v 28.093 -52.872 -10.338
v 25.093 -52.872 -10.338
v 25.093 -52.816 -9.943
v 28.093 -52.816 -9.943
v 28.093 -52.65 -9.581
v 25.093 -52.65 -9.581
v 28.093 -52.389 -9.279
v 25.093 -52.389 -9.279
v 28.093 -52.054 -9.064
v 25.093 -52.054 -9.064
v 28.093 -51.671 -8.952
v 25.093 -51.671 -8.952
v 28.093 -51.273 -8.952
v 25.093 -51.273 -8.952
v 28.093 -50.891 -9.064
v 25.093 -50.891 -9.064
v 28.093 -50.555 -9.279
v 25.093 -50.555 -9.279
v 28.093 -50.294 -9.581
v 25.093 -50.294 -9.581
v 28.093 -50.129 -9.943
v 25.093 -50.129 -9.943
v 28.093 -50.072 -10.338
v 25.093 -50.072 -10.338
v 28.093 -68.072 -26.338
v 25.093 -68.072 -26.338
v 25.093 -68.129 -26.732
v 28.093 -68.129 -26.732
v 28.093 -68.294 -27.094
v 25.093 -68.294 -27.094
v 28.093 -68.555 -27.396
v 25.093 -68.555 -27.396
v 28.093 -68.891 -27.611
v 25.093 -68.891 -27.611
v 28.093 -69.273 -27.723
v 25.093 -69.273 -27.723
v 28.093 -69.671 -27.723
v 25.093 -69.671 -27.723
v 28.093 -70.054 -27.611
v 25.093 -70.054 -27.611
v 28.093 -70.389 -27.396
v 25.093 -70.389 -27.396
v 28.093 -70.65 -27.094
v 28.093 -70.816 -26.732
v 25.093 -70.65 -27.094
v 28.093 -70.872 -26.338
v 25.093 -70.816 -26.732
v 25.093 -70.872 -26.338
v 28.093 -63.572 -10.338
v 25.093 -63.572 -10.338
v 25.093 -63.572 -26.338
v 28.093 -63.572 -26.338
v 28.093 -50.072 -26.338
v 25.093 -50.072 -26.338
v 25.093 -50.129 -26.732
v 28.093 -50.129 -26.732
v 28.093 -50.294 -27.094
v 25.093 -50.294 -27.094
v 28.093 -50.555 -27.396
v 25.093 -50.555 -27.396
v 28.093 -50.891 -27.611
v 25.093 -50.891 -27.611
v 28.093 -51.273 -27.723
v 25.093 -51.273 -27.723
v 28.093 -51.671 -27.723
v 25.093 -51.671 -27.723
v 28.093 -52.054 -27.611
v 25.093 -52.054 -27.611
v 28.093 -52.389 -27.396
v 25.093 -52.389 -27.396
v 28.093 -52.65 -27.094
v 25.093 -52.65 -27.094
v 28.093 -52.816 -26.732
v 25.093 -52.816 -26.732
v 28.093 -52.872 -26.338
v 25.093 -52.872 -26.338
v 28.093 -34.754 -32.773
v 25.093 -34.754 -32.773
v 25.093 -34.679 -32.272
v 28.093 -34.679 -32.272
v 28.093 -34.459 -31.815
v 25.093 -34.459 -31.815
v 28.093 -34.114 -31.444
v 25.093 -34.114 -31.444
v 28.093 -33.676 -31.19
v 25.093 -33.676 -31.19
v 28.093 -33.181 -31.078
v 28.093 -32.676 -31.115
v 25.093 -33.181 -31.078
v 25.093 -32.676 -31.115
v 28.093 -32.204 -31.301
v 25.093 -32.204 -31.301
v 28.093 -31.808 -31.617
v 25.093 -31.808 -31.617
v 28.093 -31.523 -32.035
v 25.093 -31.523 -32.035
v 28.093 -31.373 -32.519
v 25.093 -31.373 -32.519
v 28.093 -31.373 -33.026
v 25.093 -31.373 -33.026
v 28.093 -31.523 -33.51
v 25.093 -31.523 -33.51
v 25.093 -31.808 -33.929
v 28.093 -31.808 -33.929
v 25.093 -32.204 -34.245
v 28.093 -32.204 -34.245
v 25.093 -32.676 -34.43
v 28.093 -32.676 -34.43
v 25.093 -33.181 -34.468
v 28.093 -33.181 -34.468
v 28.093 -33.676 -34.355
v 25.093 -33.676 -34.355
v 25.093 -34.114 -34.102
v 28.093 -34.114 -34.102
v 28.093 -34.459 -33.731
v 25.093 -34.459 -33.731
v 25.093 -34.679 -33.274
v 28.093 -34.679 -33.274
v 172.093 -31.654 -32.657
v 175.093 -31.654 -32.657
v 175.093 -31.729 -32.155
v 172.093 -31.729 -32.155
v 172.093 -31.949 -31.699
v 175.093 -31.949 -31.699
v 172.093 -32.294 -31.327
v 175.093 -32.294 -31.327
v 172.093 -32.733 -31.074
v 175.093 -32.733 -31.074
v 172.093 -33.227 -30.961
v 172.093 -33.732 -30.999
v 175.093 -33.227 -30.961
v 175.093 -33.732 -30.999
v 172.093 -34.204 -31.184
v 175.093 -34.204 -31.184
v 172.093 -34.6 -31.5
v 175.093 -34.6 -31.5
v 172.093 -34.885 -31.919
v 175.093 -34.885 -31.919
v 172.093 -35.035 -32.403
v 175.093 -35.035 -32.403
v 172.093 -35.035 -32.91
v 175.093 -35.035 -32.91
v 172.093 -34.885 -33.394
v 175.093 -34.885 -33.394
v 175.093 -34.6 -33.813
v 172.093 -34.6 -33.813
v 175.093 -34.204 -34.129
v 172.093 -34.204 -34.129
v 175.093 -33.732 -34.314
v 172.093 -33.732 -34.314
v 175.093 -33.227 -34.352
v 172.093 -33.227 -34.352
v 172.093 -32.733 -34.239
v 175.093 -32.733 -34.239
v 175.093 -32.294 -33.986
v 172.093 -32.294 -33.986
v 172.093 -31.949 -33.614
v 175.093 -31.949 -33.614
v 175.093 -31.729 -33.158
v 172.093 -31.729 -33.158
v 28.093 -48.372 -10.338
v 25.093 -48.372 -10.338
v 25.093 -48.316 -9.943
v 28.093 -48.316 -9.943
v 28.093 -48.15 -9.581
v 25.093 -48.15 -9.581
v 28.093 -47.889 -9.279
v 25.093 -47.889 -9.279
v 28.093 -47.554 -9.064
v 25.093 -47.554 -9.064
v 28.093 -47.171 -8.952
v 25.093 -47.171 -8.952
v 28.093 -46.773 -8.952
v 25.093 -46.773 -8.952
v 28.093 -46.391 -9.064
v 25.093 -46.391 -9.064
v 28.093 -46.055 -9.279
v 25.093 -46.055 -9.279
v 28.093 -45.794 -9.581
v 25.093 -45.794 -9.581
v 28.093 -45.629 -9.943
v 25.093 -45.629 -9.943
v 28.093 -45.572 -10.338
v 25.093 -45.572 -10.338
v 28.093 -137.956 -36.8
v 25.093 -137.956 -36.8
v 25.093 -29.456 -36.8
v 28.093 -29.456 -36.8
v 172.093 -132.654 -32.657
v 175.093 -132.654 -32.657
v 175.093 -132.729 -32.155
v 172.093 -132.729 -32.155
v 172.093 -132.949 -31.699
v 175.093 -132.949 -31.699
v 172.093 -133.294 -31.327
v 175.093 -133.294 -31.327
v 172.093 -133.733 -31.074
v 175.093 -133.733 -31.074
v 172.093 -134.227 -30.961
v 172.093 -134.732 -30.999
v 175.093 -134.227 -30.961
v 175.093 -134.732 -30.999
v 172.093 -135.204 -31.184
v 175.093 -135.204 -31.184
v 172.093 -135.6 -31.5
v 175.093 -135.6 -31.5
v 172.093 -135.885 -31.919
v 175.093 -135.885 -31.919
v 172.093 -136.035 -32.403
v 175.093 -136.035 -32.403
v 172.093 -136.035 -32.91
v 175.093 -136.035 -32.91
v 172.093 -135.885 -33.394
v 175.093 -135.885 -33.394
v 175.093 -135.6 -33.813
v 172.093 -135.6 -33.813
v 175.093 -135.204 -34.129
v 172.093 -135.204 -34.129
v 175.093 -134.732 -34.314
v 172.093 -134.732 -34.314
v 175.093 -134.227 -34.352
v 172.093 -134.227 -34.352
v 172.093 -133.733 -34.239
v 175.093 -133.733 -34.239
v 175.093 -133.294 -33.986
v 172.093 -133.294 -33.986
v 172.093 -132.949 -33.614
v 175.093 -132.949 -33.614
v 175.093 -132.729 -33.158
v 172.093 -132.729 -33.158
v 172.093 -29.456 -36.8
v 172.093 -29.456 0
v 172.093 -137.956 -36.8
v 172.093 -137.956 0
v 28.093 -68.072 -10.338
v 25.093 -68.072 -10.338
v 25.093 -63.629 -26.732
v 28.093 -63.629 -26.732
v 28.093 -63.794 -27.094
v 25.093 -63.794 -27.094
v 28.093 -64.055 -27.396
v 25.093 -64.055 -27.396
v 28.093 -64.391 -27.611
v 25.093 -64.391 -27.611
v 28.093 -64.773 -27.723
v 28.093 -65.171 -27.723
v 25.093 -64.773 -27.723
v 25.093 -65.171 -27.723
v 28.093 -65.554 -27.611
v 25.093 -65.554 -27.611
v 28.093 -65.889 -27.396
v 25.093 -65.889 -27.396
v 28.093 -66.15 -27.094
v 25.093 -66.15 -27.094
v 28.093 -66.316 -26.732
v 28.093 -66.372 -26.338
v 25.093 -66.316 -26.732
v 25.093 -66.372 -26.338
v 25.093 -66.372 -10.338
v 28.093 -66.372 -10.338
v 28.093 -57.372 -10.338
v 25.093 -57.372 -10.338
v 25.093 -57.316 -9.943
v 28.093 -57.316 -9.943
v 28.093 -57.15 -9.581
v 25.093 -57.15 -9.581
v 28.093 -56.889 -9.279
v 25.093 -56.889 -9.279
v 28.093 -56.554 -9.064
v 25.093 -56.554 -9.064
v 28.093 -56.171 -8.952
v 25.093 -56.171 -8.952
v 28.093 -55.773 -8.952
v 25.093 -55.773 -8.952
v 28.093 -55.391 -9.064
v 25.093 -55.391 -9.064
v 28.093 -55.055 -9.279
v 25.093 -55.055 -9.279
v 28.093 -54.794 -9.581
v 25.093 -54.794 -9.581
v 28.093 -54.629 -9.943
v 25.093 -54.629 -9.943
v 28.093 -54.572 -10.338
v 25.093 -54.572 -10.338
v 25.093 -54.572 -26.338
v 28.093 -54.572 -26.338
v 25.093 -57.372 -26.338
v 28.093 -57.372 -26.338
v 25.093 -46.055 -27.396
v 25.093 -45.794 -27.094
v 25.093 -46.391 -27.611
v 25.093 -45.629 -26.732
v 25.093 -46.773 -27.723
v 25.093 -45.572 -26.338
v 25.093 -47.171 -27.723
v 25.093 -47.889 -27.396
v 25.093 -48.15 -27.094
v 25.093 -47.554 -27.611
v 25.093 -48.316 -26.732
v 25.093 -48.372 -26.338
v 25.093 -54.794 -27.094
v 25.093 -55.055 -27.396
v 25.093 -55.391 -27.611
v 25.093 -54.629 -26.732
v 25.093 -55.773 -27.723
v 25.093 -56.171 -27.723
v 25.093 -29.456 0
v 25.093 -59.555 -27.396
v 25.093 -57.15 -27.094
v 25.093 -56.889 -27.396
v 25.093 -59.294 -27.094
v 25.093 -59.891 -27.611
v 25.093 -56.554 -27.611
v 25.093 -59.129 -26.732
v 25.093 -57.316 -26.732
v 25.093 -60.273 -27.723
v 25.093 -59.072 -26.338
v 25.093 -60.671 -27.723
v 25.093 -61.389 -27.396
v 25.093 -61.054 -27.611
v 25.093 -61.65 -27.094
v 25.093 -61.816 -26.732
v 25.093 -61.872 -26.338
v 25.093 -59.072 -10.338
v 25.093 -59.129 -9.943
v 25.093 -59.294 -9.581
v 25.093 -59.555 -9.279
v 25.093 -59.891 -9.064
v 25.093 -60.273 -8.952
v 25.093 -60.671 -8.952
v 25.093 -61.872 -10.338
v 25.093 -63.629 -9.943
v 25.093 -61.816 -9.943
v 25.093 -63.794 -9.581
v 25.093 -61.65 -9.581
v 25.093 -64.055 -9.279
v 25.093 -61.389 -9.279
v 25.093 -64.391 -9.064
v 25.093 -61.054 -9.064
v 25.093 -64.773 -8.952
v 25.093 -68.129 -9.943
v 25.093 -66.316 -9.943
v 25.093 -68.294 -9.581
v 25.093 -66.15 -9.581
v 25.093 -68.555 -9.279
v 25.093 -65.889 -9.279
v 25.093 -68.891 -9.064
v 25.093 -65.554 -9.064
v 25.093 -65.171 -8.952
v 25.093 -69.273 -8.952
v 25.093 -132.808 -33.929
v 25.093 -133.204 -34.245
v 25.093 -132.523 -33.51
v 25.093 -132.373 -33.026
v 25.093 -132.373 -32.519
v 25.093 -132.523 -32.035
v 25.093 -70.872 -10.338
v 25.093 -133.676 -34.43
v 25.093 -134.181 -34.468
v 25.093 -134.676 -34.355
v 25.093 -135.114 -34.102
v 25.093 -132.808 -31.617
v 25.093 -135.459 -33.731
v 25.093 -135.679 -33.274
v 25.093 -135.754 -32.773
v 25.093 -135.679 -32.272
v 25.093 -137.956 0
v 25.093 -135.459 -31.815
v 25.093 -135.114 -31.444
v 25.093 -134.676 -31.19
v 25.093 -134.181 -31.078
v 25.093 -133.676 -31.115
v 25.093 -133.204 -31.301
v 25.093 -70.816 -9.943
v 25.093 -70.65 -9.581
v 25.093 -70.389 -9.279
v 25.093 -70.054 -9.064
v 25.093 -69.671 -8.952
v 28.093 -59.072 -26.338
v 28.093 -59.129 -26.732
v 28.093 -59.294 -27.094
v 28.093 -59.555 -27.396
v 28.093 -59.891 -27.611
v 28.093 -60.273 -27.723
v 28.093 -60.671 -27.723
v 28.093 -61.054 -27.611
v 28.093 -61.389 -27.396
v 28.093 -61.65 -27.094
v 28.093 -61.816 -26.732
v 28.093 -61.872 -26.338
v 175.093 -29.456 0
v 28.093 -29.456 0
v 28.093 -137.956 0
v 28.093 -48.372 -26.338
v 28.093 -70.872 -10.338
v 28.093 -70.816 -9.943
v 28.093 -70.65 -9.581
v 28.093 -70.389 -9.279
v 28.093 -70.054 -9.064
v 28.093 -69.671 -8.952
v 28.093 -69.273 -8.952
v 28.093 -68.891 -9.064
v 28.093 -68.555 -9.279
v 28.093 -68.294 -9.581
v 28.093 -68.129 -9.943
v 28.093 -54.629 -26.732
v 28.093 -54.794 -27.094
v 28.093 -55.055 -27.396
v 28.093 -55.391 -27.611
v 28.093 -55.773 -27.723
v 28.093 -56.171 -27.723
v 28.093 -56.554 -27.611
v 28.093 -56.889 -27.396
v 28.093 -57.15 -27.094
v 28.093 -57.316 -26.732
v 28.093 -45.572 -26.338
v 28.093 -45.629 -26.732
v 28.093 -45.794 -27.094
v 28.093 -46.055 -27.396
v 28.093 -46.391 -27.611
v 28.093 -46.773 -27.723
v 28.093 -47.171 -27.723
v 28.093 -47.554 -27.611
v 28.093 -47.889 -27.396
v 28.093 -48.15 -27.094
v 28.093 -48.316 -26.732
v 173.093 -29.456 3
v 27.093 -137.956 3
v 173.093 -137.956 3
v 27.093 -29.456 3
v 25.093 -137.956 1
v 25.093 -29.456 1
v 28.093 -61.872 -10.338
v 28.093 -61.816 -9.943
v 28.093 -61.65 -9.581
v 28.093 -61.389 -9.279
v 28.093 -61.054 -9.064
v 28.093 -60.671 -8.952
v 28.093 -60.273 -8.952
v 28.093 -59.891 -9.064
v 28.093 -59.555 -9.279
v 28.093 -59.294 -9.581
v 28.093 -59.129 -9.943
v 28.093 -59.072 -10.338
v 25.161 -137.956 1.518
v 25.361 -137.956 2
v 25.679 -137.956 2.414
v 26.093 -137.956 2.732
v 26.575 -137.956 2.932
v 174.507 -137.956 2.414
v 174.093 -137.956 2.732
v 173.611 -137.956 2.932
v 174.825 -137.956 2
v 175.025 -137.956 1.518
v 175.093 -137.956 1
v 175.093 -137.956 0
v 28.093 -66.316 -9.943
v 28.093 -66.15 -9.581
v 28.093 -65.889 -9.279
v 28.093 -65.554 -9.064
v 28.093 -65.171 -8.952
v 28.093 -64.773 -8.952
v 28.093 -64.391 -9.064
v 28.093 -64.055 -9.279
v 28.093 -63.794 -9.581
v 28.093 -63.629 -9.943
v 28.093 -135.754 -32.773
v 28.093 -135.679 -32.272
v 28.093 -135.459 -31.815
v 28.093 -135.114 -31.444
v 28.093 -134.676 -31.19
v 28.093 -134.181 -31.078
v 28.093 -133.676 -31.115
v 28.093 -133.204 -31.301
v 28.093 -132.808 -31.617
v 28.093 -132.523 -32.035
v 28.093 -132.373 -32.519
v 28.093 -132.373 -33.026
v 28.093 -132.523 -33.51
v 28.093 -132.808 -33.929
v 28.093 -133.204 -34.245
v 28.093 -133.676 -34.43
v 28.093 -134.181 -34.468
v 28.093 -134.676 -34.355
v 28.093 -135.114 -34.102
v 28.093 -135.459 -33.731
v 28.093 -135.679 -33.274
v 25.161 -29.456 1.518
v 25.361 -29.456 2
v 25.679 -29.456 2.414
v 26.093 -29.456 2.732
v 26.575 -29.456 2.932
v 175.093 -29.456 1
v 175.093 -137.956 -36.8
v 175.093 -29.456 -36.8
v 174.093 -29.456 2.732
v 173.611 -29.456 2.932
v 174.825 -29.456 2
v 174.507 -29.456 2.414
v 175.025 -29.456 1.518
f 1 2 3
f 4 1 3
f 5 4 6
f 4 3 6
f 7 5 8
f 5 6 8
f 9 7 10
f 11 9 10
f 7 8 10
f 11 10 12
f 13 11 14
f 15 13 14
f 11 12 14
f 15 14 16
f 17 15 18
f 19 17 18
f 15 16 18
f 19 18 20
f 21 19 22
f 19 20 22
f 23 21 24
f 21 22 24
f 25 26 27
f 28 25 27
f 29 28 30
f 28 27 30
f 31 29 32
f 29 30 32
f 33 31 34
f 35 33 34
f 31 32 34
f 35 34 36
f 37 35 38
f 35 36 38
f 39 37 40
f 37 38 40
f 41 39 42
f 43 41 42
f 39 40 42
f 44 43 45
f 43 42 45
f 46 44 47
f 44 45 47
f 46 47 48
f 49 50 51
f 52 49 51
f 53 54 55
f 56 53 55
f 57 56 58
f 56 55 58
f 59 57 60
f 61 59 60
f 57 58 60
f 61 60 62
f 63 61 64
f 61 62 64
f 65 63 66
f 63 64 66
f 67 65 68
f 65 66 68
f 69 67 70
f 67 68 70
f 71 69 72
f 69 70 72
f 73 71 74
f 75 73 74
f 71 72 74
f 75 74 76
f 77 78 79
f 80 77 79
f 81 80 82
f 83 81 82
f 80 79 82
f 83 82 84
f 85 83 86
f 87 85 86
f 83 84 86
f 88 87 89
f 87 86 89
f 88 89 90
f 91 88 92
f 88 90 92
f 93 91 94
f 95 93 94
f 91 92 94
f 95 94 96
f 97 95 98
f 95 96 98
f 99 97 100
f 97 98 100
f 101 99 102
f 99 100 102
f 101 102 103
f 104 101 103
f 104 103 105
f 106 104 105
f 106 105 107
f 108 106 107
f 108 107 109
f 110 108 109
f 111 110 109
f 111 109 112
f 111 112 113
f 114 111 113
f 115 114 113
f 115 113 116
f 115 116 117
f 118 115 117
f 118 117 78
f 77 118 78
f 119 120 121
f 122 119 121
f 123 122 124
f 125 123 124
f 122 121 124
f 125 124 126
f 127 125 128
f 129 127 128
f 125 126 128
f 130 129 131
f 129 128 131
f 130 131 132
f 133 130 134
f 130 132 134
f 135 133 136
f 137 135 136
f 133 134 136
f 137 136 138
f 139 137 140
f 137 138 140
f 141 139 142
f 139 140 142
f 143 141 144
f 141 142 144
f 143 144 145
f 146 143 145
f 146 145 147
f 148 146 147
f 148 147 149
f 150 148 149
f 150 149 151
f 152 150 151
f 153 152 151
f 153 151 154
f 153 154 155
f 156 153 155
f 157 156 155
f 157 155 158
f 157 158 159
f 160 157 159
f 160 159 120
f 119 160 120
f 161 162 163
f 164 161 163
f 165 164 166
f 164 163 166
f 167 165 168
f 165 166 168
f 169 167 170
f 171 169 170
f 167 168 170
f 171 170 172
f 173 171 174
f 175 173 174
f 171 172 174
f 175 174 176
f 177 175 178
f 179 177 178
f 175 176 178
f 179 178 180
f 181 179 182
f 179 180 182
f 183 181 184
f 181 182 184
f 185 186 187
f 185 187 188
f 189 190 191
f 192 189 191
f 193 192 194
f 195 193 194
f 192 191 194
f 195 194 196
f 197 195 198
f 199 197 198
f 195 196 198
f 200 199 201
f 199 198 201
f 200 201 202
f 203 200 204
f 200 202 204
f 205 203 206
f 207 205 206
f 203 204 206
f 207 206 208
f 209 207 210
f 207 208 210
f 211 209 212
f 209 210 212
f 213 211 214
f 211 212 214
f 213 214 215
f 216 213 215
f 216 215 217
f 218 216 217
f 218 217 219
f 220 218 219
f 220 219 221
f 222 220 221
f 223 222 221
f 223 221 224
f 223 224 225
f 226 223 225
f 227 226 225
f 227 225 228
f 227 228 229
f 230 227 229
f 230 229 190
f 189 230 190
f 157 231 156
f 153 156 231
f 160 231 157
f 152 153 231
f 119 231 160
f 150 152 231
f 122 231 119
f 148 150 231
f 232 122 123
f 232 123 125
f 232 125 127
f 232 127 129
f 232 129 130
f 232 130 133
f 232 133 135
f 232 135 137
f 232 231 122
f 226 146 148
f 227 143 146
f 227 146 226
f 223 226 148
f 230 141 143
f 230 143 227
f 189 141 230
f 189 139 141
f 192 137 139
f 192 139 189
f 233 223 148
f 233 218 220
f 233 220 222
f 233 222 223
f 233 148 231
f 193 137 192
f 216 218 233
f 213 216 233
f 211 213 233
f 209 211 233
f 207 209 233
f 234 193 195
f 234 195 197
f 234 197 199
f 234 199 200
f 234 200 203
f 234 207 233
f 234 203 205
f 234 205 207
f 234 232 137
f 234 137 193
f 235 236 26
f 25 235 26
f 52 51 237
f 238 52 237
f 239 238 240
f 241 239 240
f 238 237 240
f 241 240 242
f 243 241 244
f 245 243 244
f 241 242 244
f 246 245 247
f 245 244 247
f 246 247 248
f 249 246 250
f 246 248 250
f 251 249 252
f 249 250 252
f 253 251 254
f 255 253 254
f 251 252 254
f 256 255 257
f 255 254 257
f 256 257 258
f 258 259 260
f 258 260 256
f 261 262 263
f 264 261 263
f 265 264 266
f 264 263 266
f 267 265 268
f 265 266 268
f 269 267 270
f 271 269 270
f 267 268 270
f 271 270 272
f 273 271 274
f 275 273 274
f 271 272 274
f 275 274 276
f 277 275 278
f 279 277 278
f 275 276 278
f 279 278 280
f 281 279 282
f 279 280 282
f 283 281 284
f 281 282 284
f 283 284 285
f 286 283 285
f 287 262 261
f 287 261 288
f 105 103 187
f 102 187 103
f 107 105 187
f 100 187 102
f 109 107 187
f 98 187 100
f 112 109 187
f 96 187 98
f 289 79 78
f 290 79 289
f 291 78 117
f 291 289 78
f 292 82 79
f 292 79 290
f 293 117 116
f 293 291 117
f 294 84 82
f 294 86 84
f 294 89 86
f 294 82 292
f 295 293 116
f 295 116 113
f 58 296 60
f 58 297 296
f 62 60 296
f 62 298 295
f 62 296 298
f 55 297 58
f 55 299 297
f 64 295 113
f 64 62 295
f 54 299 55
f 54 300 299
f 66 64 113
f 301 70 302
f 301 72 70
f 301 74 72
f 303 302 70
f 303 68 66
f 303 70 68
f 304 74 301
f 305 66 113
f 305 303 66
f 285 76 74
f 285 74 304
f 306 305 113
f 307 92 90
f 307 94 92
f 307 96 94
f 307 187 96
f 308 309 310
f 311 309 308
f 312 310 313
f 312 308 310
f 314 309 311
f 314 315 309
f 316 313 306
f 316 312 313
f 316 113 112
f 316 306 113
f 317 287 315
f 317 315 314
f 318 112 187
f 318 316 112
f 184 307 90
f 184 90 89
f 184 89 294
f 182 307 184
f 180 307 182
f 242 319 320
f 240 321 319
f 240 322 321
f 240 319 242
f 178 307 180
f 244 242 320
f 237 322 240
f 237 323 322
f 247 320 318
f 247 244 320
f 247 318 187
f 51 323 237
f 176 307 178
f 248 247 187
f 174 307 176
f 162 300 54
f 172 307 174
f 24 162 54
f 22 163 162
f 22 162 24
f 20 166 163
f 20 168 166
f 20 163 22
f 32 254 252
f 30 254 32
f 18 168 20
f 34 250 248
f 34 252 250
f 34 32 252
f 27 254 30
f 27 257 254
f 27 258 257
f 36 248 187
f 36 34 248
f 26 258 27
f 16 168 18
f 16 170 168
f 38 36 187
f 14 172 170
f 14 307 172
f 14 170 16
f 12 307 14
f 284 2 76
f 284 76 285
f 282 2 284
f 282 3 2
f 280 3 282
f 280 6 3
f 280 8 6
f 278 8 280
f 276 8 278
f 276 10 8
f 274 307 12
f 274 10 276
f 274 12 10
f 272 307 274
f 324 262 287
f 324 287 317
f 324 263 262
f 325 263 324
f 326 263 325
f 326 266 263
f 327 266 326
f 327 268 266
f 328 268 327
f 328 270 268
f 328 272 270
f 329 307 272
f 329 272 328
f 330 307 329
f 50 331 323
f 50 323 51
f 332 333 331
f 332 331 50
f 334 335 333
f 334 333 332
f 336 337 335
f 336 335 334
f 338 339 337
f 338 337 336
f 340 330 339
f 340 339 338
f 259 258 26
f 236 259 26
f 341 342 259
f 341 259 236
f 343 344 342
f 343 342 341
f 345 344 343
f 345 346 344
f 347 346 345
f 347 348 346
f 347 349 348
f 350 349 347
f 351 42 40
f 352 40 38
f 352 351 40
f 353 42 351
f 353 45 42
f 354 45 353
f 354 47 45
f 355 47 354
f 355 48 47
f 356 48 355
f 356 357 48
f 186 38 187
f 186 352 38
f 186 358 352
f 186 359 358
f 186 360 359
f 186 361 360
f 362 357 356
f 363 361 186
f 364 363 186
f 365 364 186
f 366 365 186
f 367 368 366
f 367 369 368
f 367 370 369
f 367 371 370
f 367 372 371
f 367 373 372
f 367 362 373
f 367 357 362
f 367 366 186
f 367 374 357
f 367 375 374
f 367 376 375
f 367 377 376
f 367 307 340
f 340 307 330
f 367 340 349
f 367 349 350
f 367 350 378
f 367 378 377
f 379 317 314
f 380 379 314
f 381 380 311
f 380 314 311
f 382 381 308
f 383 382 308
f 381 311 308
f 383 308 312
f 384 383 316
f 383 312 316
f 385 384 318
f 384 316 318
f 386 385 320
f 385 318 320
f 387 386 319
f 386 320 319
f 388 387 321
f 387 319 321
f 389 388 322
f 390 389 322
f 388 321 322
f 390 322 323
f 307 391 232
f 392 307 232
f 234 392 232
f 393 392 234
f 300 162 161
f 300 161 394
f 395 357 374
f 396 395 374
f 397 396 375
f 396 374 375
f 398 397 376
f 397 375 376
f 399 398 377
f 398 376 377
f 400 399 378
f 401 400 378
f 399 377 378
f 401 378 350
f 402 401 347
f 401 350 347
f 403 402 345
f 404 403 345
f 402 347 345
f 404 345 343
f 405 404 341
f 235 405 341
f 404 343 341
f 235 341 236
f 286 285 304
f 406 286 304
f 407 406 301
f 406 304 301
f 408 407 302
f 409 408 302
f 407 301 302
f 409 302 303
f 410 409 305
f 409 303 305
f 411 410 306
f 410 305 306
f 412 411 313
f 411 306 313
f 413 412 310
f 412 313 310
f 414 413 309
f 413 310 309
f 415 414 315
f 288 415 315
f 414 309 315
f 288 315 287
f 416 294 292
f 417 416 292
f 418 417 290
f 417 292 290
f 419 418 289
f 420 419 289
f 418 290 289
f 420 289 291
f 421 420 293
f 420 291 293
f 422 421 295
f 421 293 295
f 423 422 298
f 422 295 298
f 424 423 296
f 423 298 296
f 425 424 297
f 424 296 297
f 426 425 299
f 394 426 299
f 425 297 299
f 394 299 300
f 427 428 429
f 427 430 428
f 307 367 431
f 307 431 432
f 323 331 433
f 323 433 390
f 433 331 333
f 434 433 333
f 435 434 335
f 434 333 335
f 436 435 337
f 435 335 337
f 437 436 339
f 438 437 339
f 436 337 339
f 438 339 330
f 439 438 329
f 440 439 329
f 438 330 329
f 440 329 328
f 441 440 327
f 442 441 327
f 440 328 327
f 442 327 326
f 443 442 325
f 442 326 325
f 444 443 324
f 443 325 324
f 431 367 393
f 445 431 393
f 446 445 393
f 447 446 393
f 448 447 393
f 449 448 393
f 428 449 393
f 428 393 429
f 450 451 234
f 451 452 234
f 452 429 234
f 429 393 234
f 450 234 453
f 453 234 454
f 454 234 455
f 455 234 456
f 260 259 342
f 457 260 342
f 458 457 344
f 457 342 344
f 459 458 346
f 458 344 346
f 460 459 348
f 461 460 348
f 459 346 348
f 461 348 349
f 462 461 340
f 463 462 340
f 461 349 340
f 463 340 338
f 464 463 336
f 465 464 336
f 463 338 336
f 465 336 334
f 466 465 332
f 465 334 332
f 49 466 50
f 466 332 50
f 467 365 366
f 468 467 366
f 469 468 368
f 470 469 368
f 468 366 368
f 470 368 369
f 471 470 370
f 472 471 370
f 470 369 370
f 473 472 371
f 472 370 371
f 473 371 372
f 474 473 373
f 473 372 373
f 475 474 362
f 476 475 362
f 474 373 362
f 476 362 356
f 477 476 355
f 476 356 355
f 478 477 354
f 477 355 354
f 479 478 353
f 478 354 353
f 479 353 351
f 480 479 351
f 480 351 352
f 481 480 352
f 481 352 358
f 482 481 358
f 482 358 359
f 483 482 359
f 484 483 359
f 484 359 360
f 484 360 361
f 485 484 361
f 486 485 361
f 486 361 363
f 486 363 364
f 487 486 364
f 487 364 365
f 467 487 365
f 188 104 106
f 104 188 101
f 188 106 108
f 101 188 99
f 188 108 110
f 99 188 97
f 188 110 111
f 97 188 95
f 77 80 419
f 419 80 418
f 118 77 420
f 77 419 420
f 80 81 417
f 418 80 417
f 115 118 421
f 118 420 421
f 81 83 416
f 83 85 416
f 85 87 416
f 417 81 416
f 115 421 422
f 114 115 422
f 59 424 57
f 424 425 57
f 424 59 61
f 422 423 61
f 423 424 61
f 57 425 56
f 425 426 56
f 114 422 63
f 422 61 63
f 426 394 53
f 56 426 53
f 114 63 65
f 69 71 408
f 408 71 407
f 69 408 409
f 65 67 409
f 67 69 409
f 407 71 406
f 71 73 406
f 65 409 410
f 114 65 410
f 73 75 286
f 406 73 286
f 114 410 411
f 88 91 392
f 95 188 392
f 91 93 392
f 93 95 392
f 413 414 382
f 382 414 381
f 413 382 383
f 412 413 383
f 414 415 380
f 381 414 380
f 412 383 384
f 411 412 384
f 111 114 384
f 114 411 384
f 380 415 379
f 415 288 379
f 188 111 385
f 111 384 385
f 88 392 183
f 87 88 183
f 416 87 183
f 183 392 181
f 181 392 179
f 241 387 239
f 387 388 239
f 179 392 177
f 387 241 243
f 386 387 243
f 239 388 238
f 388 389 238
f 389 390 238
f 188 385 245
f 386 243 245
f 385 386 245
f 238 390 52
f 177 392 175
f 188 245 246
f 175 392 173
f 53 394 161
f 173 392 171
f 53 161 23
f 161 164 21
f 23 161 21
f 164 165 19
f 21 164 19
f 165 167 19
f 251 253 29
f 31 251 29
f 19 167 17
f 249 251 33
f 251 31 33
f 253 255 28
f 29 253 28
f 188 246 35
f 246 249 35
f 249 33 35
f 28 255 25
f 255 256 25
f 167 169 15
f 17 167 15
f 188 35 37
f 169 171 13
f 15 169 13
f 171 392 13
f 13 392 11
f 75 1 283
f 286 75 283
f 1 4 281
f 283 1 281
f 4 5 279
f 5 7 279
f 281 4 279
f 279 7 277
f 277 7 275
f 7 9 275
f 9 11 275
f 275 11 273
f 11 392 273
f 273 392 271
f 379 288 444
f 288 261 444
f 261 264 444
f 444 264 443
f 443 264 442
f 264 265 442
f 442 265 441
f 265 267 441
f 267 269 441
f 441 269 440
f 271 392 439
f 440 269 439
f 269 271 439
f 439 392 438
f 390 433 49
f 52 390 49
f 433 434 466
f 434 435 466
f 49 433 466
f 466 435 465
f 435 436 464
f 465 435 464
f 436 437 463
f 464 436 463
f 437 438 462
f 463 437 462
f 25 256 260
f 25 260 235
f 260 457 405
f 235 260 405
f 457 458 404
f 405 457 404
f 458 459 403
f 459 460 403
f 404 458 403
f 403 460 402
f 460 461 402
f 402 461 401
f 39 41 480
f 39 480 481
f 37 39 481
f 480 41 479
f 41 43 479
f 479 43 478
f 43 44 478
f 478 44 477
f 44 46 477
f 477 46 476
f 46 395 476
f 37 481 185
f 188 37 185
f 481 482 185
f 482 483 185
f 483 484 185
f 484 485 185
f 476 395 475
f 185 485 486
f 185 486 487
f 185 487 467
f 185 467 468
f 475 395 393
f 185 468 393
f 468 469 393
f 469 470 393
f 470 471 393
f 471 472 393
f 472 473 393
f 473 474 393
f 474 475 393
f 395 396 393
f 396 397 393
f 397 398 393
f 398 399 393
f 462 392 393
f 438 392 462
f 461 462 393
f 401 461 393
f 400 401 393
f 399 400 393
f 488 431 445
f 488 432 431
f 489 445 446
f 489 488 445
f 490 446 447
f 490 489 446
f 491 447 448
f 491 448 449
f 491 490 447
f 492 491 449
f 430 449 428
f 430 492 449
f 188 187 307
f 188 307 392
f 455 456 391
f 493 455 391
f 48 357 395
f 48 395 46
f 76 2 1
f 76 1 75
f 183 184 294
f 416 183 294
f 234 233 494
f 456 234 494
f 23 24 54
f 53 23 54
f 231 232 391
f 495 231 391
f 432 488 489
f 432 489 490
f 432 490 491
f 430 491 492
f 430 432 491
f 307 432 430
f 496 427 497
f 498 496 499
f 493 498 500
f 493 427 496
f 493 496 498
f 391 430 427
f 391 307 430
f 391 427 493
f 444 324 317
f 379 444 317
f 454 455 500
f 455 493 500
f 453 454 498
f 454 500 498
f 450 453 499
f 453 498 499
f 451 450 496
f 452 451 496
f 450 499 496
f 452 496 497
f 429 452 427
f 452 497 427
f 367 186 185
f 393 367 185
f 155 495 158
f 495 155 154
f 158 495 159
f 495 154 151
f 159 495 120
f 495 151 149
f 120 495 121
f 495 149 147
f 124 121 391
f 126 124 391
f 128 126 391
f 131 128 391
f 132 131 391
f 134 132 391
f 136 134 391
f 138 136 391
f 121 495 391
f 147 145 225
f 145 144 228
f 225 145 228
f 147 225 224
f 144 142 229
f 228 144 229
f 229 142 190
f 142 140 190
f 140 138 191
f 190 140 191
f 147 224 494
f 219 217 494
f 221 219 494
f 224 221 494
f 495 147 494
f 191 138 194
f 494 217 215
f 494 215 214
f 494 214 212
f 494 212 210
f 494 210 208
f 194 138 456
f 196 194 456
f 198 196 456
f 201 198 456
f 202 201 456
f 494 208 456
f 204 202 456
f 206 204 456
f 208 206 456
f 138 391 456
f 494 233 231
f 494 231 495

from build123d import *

# Parameters (mm, degrees)
SKETCH010_W     = 150
SKETCH010_H     = 108.5
PAD004_DEPTH    = 3
SKETCH011_W     = 3
SKETCH011_H     = 108.5
PAD005_DEPTH    = 36.8
SKETCH014_R     = 1.7
POCKET006_DEPTH = 5
SKETCH015_R     = 1.7
POCKET007_DEPTH = 5
POCKET010_DEPTH = 5
FILLET_R        = 2


with BuildPart() as part:
    # Sketch010 → Pad004 (new body)
    with BuildSketch(Plane.XY):
        with Locations((100.092897, -83.705943)):
            Rectangle(SKETCH010_W, SKETCH010_H)
    extrude(amount=PAD004_DEPTH)

    # Sketch011 (on Face5 of Pad004) → Pad005 (join)
    with BuildSketch(Plane(origin=(0, 0, 0), x_dir=(1, 0, 0), z_dir=(0, 0, -1))):
        with Locations((173.592904, 83.705948)):
            Rectangle(SKETCH011_W, SKETCH011_H)
        with Locations((26.592904, 83.705948)):
            Rectangle(SKETCH011_W, SKETCH011_H)
    extrude(amount=PAD005_DEPTH)

    # Sketch014 (on Face15 of Pad005) → Pocket006 (cut)
    with BuildSketch(Plane.YZ.offset(175.092904)):
        with Locations((-134.353821, -32.656531)):
            Circle(SKETCH014_R)
        with Locations((-33.353821, -32.656531)):
            Circle(SKETCH014_R)
    extrude(amount=-POCKET006_DEPTH, mode=Mode.SUBTRACT)

    # Sketch015 (on Face13 of Pocket006) → Pocket007 (cut)
    with BuildSketch(Plane(origin=(25.092904, 0, 0), x_dir=(0, -1, 0), z_dir=(-1, 0, 0))):
        with Locations((33.054447, -32.772871)):
            Circle(SKETCH015_R)
        with Locations((134.054447, -32.772871)):
            Circle(SKETCH015_R)
    extrude(amount=-POCKET007_DEPTH, mode=Mode.SUBTRACT)

    # Sketch018 (on Face13 of Pocket007) → Pocket010 (cut)
    with BuildSketch(Plane(origin=(25.092904, 0, 0), x_dir=(0, -1, 0), z_dir=(-1, 0, 0))):
        with BuildLine():
            ThreePointArc((48.372218, -10.337513), (46.972218, -8.937513), (45.572218, -10.337513))
            Line((45.572218, -10.337513), (45.572218, -26.337513))
            ThreePointArc((45.572218, -26.337513), (46.972218, -27.737513), (48.372218, -26.337513))
            Line((48.372218, -10.337513), (48.372218, -26.337513))
        make_face()
        with BuildLine():
            ThreePointArc((52.872218, -10.337513), (51.472218, -8.937513), (50.072218, -10.337513))
            Line((50.072218, -10.337513), (50.072218, -26.337513))
            ThreePointArc((50.072218, -26.337513), (51.472218, -27.737513), (52.872218, -26.337513))
            Line((52.872218, -10.337513), (52.872218, -26.337513))
        make_face()
        with BuildLine():
            ThreePointArc((57.372218, -10.337513), (55.972218, -8.937513), (54.572218, -10.337513))
            Line((54.572218, -10.337513), (54.572218, -26.337513))
            ThreePointArc((54.572218, -26.337513), (55.972218, -27.737513), (57.372218, -26.337513))
            Line((57.372218, -10.337513), (57.372218, -26.337513))
        make_face()
        with BuildLine():
            ThreePointArc((61.872218, -10.337513), (60.472218, -8.937513), (59.072218, -10.337513))
            Line((59.072218, -10.337513), (59.072218, -26.337513))
            ThreePointArc((59.072218, -26.337513), (60.472218, -27.737513), (61.872218, -26.337513))
            Line((61.872218, -10.337513), (61.872218, -26.337513))
        make_face()
        with BuildLine():
            ThreePointArc((66.372218, -10.337513), (64.972218, -8.937513), (63.572218, -10.337513))
            Line((63.572218, -10.337513), (63.572218, -26.337513))
            ThreePointArc((63.572218, -26.337513), (64.972218, -27.737513), (66.372218, -26.337513))
            Line((66.372218, -10.337513), (66.372218, -26.337513))
        make_face()
        with BuildLine():
            ThreePointArc((70.872218, -10.337513), (69.472218, -8.937513), (68.072218, -10.337513))
            Line((68.072218, -10.337513), (68.072218, -26.337513))
            ThreePointArc((68.072218, -26.337513), (69.472218, -27.737513), (70.872218, -26.337513))
            Line((70.872218, -10.337513), (70.872218, -26.337513))
        make_face()
    extrude(amount=-POCKET010_DEPTH, mode=Mode.SUBTRACT)

    # Fillet
    fillet_edges = [part.edges().sort_by_distance(p)[0] for p in [
        (25.092897, -83.705943, 3),
        (175.092897, -83.705943, 3),
    ]]
    fillet(fillet_edges, radius=FILLET_R)


solid = part.part
